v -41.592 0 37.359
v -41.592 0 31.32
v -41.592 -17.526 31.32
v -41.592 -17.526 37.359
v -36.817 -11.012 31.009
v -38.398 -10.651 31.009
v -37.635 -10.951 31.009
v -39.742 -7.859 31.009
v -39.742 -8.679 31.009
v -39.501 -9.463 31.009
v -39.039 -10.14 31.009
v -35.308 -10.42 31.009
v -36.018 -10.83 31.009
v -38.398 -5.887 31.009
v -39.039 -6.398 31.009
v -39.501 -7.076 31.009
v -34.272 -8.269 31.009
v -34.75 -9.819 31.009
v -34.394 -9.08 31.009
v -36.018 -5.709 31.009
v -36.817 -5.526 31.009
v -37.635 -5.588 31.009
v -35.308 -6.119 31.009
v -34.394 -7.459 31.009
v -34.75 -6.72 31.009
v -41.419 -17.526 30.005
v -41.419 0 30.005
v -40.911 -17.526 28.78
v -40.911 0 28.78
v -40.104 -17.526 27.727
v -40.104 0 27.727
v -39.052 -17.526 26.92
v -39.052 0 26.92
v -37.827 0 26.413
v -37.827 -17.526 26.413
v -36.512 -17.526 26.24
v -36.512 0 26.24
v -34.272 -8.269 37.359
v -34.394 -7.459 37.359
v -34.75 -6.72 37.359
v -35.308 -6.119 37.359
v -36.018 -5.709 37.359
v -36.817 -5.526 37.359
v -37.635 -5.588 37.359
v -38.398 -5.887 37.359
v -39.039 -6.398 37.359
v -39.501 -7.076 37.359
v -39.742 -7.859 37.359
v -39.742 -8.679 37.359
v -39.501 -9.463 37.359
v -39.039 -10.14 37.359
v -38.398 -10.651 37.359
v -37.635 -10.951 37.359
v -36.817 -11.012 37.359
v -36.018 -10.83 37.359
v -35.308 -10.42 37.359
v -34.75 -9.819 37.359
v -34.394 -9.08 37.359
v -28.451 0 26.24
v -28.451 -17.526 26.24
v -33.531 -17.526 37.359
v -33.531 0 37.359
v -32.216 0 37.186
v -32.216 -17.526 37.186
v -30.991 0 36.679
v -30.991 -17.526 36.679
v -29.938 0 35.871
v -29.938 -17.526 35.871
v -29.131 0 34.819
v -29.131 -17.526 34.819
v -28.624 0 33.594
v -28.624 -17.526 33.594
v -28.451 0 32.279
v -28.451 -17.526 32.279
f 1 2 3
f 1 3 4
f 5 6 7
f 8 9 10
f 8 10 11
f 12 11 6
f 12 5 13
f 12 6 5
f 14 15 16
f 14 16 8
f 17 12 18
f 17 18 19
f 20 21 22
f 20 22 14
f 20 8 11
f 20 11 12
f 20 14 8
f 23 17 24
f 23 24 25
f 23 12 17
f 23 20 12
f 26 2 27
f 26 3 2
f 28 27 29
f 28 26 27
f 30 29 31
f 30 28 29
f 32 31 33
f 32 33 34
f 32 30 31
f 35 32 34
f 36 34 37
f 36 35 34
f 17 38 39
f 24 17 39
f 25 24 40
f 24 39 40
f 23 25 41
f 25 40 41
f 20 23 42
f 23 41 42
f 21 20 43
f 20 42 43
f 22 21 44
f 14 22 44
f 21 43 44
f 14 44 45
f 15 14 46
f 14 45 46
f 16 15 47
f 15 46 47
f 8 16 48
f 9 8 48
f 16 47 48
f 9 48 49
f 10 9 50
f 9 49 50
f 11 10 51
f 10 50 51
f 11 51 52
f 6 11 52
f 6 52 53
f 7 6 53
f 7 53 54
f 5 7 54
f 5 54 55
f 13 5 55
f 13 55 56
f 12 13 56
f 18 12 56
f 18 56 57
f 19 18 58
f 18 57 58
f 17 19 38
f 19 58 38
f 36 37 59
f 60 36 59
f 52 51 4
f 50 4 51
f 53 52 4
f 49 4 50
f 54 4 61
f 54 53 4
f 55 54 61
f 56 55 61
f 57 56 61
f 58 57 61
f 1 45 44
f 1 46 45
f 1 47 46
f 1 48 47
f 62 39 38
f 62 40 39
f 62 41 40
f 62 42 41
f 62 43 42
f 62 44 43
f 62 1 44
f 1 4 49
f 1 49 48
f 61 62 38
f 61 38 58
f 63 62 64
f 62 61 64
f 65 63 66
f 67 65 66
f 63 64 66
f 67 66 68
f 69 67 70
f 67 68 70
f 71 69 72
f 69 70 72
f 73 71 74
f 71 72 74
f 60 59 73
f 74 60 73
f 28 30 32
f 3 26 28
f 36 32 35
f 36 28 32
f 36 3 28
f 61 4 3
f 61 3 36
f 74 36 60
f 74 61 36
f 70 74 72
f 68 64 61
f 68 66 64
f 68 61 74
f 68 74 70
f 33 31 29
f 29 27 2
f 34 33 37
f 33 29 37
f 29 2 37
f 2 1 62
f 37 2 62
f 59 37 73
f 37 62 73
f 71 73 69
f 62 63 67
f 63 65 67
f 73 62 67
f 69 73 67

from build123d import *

# Parameters (mm, degrees)
F0_W     = 13.141317
F0_H     = 11.119574
F1_DEPTH = 17.526
F2_R     = 2.750597
F3_DEPTH = 6.35
F4_R     = 5.08


with BuildPart() as f1:
    # F0 (on Front) → F1 (new body)
    with BuildSketch(Plane.XZ):
        with Locations((-35.02122, 31.799372)):
            Rectangle(F0_W, F0_H)
    extrude(amount=F1_DEPTH)

    # F2 (on face) → F3 (cut)
    with BuildSketch(Plane.XY.offset(37.359159)):
        with Locations((-37.022505, -8.269278)):
            Circle(F2_R)
    extrude(amount=-F3_DEPTH, mode=Mode.SUBTRACT)

    # F4
    f4_edges = [f1.edges().sort_by_distance(p)[0] for p in [
        (-28.450562, -8.763, 37.359159),
        (-41.591879, -8.763, 26.239585),
    ]]
    fillet(f4_edges, radius=F4_R)


solid = f1.part
